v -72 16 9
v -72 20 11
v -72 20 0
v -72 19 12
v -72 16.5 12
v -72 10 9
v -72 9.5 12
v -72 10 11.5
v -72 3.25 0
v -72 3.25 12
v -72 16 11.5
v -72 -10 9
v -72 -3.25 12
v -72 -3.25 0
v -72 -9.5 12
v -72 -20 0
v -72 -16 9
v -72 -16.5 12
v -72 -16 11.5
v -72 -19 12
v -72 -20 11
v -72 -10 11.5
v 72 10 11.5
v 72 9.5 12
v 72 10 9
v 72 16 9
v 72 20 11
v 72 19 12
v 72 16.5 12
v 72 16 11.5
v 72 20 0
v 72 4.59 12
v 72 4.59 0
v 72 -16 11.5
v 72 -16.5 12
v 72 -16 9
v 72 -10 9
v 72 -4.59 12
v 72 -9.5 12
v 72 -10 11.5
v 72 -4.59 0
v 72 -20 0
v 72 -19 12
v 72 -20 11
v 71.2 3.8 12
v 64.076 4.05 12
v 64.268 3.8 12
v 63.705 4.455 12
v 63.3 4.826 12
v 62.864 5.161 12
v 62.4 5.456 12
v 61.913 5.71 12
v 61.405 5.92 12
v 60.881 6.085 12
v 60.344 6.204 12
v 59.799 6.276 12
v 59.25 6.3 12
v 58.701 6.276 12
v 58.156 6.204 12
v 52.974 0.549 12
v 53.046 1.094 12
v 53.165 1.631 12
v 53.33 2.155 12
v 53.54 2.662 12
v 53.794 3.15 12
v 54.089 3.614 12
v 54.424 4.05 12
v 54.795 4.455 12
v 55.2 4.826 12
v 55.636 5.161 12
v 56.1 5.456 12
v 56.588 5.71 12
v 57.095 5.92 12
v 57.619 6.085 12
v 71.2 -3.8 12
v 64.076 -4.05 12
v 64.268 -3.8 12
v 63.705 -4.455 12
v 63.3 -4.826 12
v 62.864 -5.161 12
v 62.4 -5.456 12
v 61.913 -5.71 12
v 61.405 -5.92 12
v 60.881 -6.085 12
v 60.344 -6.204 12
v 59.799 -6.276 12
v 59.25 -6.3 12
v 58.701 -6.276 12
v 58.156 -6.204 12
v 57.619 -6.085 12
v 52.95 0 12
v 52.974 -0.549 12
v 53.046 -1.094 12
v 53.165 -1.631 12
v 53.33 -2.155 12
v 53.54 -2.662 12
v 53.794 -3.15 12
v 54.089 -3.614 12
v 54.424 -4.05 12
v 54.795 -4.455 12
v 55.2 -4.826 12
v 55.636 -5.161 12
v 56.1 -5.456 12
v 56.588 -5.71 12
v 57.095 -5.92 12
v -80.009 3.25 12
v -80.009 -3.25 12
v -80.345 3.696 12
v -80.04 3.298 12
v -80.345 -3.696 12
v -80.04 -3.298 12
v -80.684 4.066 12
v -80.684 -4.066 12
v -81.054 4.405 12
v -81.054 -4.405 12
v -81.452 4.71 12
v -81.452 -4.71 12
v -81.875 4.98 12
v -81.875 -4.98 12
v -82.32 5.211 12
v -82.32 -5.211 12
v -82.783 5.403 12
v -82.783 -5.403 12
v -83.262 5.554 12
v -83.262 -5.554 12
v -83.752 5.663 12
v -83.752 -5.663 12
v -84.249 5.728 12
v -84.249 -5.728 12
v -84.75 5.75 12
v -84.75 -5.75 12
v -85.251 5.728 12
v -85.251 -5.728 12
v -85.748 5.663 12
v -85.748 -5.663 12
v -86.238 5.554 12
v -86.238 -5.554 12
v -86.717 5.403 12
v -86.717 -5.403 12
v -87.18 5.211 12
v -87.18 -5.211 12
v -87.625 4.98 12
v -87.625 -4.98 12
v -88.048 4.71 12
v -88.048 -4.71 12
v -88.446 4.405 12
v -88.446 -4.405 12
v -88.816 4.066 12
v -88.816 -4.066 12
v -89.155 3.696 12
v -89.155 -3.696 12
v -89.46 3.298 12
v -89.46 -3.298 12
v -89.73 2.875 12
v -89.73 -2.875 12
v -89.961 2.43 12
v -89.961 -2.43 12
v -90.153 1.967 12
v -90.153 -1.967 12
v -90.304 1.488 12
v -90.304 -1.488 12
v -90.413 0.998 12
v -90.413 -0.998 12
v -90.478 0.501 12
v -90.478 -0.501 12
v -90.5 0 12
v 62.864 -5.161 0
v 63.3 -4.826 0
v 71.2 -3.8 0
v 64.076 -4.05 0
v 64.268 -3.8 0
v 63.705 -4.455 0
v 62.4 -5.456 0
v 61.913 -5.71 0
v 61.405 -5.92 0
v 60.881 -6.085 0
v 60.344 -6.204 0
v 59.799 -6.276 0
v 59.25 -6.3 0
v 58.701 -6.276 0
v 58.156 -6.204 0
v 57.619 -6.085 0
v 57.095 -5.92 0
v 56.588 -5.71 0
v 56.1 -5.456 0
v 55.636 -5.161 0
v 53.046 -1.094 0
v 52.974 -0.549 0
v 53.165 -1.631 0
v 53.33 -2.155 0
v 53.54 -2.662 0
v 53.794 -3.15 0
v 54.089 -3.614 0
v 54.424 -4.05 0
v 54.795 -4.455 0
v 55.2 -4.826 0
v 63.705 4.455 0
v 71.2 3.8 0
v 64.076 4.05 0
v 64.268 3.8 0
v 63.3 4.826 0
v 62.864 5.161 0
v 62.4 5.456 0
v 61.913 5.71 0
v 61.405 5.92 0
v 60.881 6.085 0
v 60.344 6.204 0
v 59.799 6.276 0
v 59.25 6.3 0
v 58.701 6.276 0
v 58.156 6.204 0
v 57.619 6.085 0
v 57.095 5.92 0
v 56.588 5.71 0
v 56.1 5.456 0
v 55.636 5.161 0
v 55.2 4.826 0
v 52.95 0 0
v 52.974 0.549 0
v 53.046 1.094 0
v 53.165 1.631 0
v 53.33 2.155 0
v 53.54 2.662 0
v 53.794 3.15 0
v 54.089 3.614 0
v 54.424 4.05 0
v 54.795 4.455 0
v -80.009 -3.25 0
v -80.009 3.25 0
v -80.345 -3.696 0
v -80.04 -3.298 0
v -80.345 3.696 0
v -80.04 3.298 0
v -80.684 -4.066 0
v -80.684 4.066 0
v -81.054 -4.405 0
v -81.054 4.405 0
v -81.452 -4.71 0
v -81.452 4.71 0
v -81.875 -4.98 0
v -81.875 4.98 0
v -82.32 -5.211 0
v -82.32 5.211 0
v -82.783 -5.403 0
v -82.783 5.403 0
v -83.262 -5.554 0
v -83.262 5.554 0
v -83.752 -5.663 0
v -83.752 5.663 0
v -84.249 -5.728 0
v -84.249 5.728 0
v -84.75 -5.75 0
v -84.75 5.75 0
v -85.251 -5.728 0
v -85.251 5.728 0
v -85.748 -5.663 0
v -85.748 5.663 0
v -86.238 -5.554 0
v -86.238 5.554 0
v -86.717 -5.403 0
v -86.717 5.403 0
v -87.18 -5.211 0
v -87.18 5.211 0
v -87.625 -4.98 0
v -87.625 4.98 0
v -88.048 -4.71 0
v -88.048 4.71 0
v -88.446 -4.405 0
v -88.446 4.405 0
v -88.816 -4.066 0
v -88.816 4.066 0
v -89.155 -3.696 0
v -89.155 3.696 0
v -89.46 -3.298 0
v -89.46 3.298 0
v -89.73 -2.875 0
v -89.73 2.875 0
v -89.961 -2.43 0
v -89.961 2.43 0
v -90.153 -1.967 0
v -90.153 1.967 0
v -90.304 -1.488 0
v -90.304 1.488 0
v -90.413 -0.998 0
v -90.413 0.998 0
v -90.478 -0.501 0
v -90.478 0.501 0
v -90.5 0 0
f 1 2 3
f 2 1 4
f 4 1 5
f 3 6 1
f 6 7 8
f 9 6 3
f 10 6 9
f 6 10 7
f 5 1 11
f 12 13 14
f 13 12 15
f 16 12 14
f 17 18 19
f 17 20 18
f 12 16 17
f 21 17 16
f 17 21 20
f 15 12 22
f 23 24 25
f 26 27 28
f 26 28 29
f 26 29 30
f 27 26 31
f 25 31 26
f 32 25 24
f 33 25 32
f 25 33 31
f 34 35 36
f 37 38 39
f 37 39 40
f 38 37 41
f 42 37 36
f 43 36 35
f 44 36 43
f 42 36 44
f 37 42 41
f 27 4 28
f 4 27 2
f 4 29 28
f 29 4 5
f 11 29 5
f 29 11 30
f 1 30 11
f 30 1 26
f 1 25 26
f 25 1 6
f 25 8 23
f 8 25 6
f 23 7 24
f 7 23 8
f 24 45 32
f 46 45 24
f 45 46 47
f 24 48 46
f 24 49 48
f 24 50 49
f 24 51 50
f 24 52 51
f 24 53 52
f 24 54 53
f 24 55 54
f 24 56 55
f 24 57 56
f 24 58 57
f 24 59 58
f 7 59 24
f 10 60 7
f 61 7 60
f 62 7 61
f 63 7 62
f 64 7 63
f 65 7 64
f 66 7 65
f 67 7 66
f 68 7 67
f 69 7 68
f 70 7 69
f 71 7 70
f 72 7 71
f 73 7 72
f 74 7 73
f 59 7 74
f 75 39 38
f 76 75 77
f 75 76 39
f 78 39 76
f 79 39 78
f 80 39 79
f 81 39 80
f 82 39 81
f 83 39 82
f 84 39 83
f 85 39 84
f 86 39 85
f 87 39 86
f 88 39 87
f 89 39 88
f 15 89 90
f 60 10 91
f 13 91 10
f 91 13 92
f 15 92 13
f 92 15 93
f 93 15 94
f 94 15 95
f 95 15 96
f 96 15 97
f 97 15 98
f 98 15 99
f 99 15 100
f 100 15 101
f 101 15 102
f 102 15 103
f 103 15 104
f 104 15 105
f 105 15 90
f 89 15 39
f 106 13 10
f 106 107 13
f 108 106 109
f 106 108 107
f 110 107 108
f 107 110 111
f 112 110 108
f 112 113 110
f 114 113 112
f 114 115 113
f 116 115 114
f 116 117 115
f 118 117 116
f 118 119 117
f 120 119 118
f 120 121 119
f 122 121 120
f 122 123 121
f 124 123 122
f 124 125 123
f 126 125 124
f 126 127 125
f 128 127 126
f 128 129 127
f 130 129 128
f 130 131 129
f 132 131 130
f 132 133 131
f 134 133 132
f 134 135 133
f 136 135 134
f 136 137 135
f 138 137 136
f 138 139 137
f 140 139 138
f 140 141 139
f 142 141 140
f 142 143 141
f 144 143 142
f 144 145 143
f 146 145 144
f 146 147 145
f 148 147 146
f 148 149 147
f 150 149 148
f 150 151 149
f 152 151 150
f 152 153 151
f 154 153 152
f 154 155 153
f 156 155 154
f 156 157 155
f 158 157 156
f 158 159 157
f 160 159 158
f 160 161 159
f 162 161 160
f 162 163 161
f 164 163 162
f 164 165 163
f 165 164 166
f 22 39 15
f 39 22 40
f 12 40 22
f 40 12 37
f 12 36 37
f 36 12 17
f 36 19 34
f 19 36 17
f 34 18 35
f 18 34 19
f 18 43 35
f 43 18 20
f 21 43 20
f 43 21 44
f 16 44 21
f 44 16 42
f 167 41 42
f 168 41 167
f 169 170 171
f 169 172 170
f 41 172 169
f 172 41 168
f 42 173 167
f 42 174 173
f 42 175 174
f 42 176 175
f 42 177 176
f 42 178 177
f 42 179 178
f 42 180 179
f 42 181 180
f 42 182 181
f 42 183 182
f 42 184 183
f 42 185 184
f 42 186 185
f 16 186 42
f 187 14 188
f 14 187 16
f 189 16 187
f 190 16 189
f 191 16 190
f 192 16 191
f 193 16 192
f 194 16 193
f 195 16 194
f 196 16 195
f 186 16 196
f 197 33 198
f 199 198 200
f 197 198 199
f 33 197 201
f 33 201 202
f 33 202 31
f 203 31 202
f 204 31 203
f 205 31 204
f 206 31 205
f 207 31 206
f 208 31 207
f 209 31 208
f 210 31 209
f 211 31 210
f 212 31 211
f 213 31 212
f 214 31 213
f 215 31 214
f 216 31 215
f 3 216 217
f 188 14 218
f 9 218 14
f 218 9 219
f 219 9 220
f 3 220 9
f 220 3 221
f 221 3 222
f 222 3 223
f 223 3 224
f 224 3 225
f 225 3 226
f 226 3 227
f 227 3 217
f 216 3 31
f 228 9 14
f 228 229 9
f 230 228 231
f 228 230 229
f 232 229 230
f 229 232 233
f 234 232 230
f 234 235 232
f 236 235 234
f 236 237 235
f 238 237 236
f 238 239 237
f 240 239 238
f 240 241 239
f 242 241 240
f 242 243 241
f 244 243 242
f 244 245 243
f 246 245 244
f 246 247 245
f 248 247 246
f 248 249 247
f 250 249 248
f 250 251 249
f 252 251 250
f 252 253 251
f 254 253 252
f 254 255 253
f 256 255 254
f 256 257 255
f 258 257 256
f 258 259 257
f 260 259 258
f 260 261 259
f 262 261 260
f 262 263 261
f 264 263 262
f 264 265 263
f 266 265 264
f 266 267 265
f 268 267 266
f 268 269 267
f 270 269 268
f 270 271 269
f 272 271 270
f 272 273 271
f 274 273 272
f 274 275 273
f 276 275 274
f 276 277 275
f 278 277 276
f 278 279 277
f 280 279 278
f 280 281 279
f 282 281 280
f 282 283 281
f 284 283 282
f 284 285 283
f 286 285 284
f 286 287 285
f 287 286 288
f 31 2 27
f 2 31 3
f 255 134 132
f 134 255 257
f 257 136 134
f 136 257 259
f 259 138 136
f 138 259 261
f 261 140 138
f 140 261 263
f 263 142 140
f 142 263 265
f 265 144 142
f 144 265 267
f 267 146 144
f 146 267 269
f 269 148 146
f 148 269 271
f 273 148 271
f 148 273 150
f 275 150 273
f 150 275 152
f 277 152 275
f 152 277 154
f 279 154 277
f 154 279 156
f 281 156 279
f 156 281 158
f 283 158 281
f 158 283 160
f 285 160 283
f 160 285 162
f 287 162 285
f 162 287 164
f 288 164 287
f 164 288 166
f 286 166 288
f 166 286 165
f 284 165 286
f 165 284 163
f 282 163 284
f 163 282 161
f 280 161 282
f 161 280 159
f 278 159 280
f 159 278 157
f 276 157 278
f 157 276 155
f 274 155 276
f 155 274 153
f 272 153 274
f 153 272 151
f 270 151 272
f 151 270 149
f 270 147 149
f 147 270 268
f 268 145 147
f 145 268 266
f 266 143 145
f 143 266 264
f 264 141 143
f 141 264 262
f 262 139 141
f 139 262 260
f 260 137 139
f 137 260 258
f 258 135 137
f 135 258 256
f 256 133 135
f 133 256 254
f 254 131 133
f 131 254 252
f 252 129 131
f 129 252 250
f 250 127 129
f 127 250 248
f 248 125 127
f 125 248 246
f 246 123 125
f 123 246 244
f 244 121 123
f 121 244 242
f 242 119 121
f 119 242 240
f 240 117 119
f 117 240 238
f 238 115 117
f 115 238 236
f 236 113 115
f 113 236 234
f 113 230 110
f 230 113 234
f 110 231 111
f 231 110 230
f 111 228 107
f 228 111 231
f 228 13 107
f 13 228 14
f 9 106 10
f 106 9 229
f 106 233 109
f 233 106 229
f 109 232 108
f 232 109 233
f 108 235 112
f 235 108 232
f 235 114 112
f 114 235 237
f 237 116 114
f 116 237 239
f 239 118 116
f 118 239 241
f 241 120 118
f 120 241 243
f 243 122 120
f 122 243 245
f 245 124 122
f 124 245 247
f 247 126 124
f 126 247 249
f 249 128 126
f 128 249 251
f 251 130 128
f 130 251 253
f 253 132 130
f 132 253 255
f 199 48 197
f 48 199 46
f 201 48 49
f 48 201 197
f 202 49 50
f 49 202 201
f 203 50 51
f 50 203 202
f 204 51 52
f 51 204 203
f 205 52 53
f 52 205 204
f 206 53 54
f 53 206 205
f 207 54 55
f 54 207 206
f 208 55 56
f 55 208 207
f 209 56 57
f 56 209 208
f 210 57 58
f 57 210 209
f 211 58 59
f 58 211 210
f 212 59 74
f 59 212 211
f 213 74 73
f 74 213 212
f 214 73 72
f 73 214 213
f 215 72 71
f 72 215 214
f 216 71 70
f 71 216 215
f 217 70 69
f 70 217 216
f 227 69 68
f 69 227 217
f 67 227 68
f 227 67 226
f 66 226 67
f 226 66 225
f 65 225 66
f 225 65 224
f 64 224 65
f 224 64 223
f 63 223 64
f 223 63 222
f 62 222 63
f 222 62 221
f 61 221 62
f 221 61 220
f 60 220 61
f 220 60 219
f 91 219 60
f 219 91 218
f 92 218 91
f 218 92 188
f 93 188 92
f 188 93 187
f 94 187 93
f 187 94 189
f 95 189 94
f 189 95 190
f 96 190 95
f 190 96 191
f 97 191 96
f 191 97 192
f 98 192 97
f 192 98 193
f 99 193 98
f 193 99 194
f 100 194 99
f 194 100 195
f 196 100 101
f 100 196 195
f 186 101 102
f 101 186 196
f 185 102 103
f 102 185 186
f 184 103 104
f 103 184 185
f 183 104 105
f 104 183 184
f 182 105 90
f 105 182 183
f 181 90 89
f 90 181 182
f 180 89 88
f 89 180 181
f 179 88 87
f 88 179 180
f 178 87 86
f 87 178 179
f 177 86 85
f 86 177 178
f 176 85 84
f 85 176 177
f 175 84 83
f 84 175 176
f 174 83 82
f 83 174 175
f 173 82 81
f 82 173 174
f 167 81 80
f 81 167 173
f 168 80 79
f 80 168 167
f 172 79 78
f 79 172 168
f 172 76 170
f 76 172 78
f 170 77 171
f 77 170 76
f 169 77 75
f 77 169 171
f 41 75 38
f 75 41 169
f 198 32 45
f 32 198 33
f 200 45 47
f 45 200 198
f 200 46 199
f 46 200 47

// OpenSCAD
// Train track — wooden-railway-compatible track pieces: straights, curves, a
// ramp, a 90-degree crossing, an end stop with a buffer, and a name tile with a
// word inlaid between the rails. Pieces join each other and the common
// 40 mm wooden track with the usual round peg and socket.
//
// Profile (see README for sources): 40 mm wide, 12 mm high, two 6 mm x 3 mm
// grooves 26 mm apart centre to centre; peg head Ø11.5 on a 7 mm neck, socket
// the peg plus clearance. Standard straights are 54 / 108 / 144 / 216 mm, the
// large curve is 45 degrees at 182 mm inner radius, the ascending track rises
// 64 mm over 216 mm.
//
// Every piece prints flat on its bottom face with the grooves up and no
// supports: the profile is vertical walls and an open-topped groove, the pegs
// sit on the bed, the sockets are through-holes. The ramp is solid under its
// deck, and a male peg at its top end stands on a post down to the bed, which
// passes through the mating track's socket hole.
//
// Written to the MakerWorld Parametric Model Maker customizer conventions so
// the same file works unchanged on MakerWorld and in ScadBuddy.
//
// The colour parameters are the extruder order: track_color is extruder 1,
// text_color extruder 2 (only used when there is text).

/* [Piece] */

// Which piece
type = "straight"; // [straight:Straight, curve:Curve, ramp:Ramp (ascending), crossing:Crossing (90°), end_stop:End stop, name_tile:Name tile]

// Length in mm of a straight, ramp, crossing arm, end stop or name tile (54, 108, 144, 216 are the standard sizes)
length = 144; // [36:18:216]

// Curve inner-edge radius in mm (182 = the standard large curve, 90 = the short curve)
curve_radius = 182; // [80:2:300]

// Curve angle in degrees (45 = the standard curve, 8 make a circle)
curve_angle = 45; // [22.5:22.5:90]

// Ramp height gain in mm (64 = one standard level)
ramp_rise = 64; // [16:4:96]

// Connector at each end (first, second)
connectors = "male_female"; // [male_female:Peg - socket, male_male:Peg - peg, female_female:Socket - socket]

/* [Fit] */

// Gap around the peg in each socket, mm. Raise it if pegs are tight
connector_clearance = 0.3; // [0.1:0.05:0.6]

/* [Decor] */

// Word inlaid between the rails of a name tile, or in the side of a straight
text = ""; // 20

// Typeface (the app fills this dropdown from the fonts installed in the image)
font = "DejaVu Sans:style=Bold"; // font

/* [Colors] */

// Track colour (extruder 1)
track_color = "#C8A06A"; // color

// Text colour (extruder 2)
text_color = "#5D4037"; // color

/* [Hidden] */

$fn = 72;

W = 40;                 // track width
T = 12;                 // track height
GROOVE_W = 6;
GROOVE_D = 3;
GROOVE_C = 13;          // groove centre from the track centre line (26 apart)
EDGE_CH = 1;            // chamfer on the top outside edges
GROOVE_CH = 0.5;        // chamfer on the groove lips
PEG_D = 11.5;
PEG_NECK = 7;           // neck length, end face to the head
PEG_NECK_W = 6.5;
HEAD_C = PEG_NECK + PEG_D / 2;      // head centre from the end face, 12.75
// The socket is sized for the largest common peg (12 mm head, 7 mm neck), so
// store-bought track fits too; printed pairs then join with a little play.
SOCKET_D = 12 + 2 * connector_clearance;
SOCKET_THROAT_W = 7 + 2 * connector_clearance;
MOUTH_CH = 0.8;         // flare at the socket mouth
TEXT_DEPTH = 1;

L = length;
RI = curve_radius;
RC = curve_radius + W / 2;          // centre-line radius
A = curve_angle;
RISE = ramp_rise;

kind_a = connectors == "female_female" ? "female" : "male";
kind_b = connectors == "male_male" ? "male" : "female";

// ---------------------------------------------------------------- profile

// Cross-section in (across, up): 2D x is across the track, 2D y is up.
module deck_2d() {
    polygon([[-W / 2, 0], [W / 2, 0], [W / 2, T - EDGE_CH], [W / 2 - EDGE_CH, T],
             [-W / 2 + EDGE_CH, T], [-W / 2, T - EDGE_CH]]);
}

module grooves_2d() {
    for (s = [-1, 1]) translate([s * GROOVE_C, 0])
        polygon([[-GROOVE_W / 2, T - GROOVE_D], [GROOVE_W / 2, T - GROOVE_D],
                 [GROOVE_W / 2, T - GROOVE_CH], [GROOVE_W / 2 + GROOVE_CH, T],
                 [GROOVE_W / 2 + GROOVE_CH, T + 1], [-GROOVE_W / 2 - GROOVE_CH, T + 1],
                 [-GROOVE_W / 2 - GROOVE_CH, T], [-GROOVE_W / 2, T - GROOVE_CH]]);
}

module profile_2d() { difference() { deck_2d(); grooves_2d(); } }

// A 2D cross-section swept along +x from x0 to x1: 2D (a, b) -> (x, a, b).
module sweep_x(x0, x1) {
    translate([x0, 0, 0]) rotate([90, 0, 90]) linear_extrude(x1 - x0) children();
}

// ---------------------------------------------------------------- connectors

// In an end's frame: end face at x = 0, piece at x < 0, pointing +x.
module peg(h) {
    linear_extrude(h) {
        translate([-1, -PEG_NECK_W / 2]) square([HEAD_C + 1, PEG_NECK_W]);
        translate([HEAD_C, 0]) circle(d = PEG_D);
    }
}

module socket(h) {
    translate([0, 0, -1]) linear_extrude(h + 2) {
        translate([-HEAD_C, 0]) circle(d = SOCKET_D);
        translate([-HEAD_C, -SOCKET_THROAT_W / 2]) square([HEAD_C + 1, SOCKET_THROAT_W]);
        // flared mouth
        polygon([[0.01, -SOCKET_THROAT_W / 2 - MOUTH_CH], [0.01, SOCKET_THROAT_W / 2 + MOUTH_CH],
                 [-MOUTH_CH, SOCKET_THROAT_W / 2], [-MOUTH_CH, -SOCKET_THROAT_W / 2]]);
    }
}

// End frames of the current piece: [position, outward heading in degrees,
// connector kind, z of the deck bottom].
function ends() =
    type == "curve" ?
        [[[RC, 0], -90, kind_a, 0],
         [[RC * cos(A), RC * sin(A)], A + 90, kind_b, 0]]
    : type == "crossing" ?
        [[[-L / 2, 0], 180, kind_a, 0], [[L / 2, 0], 0, kind_b, 0],
         [[0, -L / 2], -90, kind_a, 0], [[0, L / 2], 90, kind_b, 0]]
    : type == "end_stop" ?
        [[[-L / 2, 0], 180, kind_a, 0]]
    : type == "ramp" ?
        [[[-L / 2, 0], 180, kind_a, 0], [[L / 2, 0], 0, kind_b, RISE]]
    :   [[[-L / 2, 0], 180, kind_a, 0], [[L / 2, 0], 0, kind_b, 0]];

// A peg at the top of the ramp stands on a post down to the bed.
module pegs() {
    for (e = ends()) if (e[2] == "male")
        translate([e[0][0], e[0][1], 0]) rotate([0, 0, e[1]]) peg(e[3] + T);
}

module sockets() {
    for (e = ends()) if (e[2] == "female")
        translate([e[0][0], e[0][1], 0]) rotate([0, 0, e[1]]) socket(e[3] + T);
}

// ---------------------------------------------------------------- pieces

// Ramp centre line: level landings at both ends, a cosine S between them.
FLAT = min(20, L / 6);
N_SEG = 32;
function ramp_x(i) = -L / 2 + FLAT + (L - 2 * FLAT) * i / N_SEG;
function ramp_z(i) = RISE * (1 - cos(180 * i / N_SEG)) / 2;

module ramp() {
    // Level landings.
    sweep_x(-L / 2, -L / 2 + FLAT) profile_2d();
    translate([0, 0, RISE]) sweep_x(L / 2 - FLAT, L / 2) profile_2d();
    // Sheared segments: each keeps the profile vertical, so the grooves stay
    // 3 mm deep measured straight down.
    for (i = [0 : N_SEG - 1]) {
        x0 = ramp_x(i); x1 = ramp_x(i + 1);
        z0 = ramp_z(i); z1 = ramp_z(i + 1);
        k = (z1 - z0) / (x1 - x0);
        multmatrix([[1, 0, 0, 0], [0, 1, 0, 0], [k, 0, 1, z0 - k * x0], [0, 0, 0, 1]])
            sweep_x(x0, x1) profile_2d();
    }
    // Solid underneath, up into the deck.
    rotate([90, 0, 0]) linear_extrude(W, center = true)
        polygon(concat([[-L / 2, 0], [L / 2, 0], [L / 2, RISE + 1]],
                       [for (i = [N_SEG : -1 : 0]) [ramp_x(i), ramp_z(i) + 1]],
                       [[-L / 2, 1]]));
}

module curve() {
    rotate_extrude(angle = A) translate([RC, 0]) profile_2d();
}

module crossing() {
    difference() {
        union() {
            sweep_x(-L / 2, L / 2) deck_2d();
            rotate([0, 0, 90]) sweep_x(-L / 2, L / 2) deck_2d();
        }
        sweep_x(-L / 2 - 1, L / 2 + 1) grooves_2d();
        rotate([0, 0, 90]) sweep_x(-L / 2 - 1, L / 2 + 1) grooves_2d();
    }
}

// Buffer across the far end: a block with a rounded top.
BUF_L = 14;
BUF_H = 26;
module buffer() {
    hull() {
        translate([L / 2 - BUF_L, -W / 2, 0]) cube([BUF_L, W, BUF_H - BUF_L / 2]);
        translate([L / 2 - BUF_L / 2, 0, BUF_H - BUF_L / 2])
            rotate([90, 0, 0]) cylinder(d = BUF_L, h = W, center = true);
    }
}

module straight() {
    sweep_x(-L / 2, L / 2) profile_2d();
}

module base() {
    if (type == "curve") curve();
    else if (type == "ramp") ramp();
    else if (type == "crossing") crossing();
    else if (type == "end_stop") { straight(); buffer(); }
    else straight();
}

// ---------------------------------------------------------------- text

on_side = type == "straight";
on_top = type == "name_tile";
// The top strip between the grooves, clear of the socket at each end; or the
// side face below the edge chamfer.
SOCKET_REACH = HEAD_C + SOCKET_D / 2 + 2;
box_w = on_top ? L - 2 * SOCKET_REACH : L - 8;
box_h = on_top ? 2 * (GROOVE_C - GROOVE_W / 2 - GROOVE_CH) - 3 : T - EDGE_CH - 3;
side_zc = 1.5 + box_h / 2;
text_fits = len(text) > 0 && (on_side || on_top) && box_w >= 6 && box_h >= 3;

// Shrink-only fit, as in models/name-sign.
module fit_x(w) {
    projection(cut = true) translate([0, 0, -0.5])
        resize([w, 0, 0], auto = [false, true, false])
            union() {
                linear_extrude(1) children();
                translate([-w / 2, 0, 10]) cube([w, 0.01, 0.01]);
            }
}

module fit_y(h) {
    projection(cut = true) translate([0, 0, -0.5])
        resize([0, h, 0], auto = [true, false, false])
            union() {
                linear_extrude(1) children();
                translate([0, -h / 2, 10]) cube([0.01, h, 0.01]);
            }
}

module word_2d() {
    intersection() {
        fit_y(box_h) fit_x(box_w)
            text(text, size = box_h * 0.7, font = font, halign = "center", valign = "center");
        square([box_w, box_h], center = true);
    }
}

module pocket() {
    if (text_fits) {
        if (on_top)
            translate([0, 0, T - TEXT_DEPTH]) linear_extrude(TEXT_DEPTH + 0.001) word_2d();
        else
            translate([0, -W / 2 + TEXT_DEPTH, side_zc])
                rotate([90, 0, 0]) linear_extrude(TEXT_DEPTH + 0.001) word_2d();
    }
}

// ---------------------------------------------------------------- parts

module piece() {
    difference() {
        union() { base(); pegs(); }
        sockets();
    }
}

color(track_color) difference() { piece(); pocket(); }
if (text_fits) color(text_color) intersection() { piece(); pocket(); }
